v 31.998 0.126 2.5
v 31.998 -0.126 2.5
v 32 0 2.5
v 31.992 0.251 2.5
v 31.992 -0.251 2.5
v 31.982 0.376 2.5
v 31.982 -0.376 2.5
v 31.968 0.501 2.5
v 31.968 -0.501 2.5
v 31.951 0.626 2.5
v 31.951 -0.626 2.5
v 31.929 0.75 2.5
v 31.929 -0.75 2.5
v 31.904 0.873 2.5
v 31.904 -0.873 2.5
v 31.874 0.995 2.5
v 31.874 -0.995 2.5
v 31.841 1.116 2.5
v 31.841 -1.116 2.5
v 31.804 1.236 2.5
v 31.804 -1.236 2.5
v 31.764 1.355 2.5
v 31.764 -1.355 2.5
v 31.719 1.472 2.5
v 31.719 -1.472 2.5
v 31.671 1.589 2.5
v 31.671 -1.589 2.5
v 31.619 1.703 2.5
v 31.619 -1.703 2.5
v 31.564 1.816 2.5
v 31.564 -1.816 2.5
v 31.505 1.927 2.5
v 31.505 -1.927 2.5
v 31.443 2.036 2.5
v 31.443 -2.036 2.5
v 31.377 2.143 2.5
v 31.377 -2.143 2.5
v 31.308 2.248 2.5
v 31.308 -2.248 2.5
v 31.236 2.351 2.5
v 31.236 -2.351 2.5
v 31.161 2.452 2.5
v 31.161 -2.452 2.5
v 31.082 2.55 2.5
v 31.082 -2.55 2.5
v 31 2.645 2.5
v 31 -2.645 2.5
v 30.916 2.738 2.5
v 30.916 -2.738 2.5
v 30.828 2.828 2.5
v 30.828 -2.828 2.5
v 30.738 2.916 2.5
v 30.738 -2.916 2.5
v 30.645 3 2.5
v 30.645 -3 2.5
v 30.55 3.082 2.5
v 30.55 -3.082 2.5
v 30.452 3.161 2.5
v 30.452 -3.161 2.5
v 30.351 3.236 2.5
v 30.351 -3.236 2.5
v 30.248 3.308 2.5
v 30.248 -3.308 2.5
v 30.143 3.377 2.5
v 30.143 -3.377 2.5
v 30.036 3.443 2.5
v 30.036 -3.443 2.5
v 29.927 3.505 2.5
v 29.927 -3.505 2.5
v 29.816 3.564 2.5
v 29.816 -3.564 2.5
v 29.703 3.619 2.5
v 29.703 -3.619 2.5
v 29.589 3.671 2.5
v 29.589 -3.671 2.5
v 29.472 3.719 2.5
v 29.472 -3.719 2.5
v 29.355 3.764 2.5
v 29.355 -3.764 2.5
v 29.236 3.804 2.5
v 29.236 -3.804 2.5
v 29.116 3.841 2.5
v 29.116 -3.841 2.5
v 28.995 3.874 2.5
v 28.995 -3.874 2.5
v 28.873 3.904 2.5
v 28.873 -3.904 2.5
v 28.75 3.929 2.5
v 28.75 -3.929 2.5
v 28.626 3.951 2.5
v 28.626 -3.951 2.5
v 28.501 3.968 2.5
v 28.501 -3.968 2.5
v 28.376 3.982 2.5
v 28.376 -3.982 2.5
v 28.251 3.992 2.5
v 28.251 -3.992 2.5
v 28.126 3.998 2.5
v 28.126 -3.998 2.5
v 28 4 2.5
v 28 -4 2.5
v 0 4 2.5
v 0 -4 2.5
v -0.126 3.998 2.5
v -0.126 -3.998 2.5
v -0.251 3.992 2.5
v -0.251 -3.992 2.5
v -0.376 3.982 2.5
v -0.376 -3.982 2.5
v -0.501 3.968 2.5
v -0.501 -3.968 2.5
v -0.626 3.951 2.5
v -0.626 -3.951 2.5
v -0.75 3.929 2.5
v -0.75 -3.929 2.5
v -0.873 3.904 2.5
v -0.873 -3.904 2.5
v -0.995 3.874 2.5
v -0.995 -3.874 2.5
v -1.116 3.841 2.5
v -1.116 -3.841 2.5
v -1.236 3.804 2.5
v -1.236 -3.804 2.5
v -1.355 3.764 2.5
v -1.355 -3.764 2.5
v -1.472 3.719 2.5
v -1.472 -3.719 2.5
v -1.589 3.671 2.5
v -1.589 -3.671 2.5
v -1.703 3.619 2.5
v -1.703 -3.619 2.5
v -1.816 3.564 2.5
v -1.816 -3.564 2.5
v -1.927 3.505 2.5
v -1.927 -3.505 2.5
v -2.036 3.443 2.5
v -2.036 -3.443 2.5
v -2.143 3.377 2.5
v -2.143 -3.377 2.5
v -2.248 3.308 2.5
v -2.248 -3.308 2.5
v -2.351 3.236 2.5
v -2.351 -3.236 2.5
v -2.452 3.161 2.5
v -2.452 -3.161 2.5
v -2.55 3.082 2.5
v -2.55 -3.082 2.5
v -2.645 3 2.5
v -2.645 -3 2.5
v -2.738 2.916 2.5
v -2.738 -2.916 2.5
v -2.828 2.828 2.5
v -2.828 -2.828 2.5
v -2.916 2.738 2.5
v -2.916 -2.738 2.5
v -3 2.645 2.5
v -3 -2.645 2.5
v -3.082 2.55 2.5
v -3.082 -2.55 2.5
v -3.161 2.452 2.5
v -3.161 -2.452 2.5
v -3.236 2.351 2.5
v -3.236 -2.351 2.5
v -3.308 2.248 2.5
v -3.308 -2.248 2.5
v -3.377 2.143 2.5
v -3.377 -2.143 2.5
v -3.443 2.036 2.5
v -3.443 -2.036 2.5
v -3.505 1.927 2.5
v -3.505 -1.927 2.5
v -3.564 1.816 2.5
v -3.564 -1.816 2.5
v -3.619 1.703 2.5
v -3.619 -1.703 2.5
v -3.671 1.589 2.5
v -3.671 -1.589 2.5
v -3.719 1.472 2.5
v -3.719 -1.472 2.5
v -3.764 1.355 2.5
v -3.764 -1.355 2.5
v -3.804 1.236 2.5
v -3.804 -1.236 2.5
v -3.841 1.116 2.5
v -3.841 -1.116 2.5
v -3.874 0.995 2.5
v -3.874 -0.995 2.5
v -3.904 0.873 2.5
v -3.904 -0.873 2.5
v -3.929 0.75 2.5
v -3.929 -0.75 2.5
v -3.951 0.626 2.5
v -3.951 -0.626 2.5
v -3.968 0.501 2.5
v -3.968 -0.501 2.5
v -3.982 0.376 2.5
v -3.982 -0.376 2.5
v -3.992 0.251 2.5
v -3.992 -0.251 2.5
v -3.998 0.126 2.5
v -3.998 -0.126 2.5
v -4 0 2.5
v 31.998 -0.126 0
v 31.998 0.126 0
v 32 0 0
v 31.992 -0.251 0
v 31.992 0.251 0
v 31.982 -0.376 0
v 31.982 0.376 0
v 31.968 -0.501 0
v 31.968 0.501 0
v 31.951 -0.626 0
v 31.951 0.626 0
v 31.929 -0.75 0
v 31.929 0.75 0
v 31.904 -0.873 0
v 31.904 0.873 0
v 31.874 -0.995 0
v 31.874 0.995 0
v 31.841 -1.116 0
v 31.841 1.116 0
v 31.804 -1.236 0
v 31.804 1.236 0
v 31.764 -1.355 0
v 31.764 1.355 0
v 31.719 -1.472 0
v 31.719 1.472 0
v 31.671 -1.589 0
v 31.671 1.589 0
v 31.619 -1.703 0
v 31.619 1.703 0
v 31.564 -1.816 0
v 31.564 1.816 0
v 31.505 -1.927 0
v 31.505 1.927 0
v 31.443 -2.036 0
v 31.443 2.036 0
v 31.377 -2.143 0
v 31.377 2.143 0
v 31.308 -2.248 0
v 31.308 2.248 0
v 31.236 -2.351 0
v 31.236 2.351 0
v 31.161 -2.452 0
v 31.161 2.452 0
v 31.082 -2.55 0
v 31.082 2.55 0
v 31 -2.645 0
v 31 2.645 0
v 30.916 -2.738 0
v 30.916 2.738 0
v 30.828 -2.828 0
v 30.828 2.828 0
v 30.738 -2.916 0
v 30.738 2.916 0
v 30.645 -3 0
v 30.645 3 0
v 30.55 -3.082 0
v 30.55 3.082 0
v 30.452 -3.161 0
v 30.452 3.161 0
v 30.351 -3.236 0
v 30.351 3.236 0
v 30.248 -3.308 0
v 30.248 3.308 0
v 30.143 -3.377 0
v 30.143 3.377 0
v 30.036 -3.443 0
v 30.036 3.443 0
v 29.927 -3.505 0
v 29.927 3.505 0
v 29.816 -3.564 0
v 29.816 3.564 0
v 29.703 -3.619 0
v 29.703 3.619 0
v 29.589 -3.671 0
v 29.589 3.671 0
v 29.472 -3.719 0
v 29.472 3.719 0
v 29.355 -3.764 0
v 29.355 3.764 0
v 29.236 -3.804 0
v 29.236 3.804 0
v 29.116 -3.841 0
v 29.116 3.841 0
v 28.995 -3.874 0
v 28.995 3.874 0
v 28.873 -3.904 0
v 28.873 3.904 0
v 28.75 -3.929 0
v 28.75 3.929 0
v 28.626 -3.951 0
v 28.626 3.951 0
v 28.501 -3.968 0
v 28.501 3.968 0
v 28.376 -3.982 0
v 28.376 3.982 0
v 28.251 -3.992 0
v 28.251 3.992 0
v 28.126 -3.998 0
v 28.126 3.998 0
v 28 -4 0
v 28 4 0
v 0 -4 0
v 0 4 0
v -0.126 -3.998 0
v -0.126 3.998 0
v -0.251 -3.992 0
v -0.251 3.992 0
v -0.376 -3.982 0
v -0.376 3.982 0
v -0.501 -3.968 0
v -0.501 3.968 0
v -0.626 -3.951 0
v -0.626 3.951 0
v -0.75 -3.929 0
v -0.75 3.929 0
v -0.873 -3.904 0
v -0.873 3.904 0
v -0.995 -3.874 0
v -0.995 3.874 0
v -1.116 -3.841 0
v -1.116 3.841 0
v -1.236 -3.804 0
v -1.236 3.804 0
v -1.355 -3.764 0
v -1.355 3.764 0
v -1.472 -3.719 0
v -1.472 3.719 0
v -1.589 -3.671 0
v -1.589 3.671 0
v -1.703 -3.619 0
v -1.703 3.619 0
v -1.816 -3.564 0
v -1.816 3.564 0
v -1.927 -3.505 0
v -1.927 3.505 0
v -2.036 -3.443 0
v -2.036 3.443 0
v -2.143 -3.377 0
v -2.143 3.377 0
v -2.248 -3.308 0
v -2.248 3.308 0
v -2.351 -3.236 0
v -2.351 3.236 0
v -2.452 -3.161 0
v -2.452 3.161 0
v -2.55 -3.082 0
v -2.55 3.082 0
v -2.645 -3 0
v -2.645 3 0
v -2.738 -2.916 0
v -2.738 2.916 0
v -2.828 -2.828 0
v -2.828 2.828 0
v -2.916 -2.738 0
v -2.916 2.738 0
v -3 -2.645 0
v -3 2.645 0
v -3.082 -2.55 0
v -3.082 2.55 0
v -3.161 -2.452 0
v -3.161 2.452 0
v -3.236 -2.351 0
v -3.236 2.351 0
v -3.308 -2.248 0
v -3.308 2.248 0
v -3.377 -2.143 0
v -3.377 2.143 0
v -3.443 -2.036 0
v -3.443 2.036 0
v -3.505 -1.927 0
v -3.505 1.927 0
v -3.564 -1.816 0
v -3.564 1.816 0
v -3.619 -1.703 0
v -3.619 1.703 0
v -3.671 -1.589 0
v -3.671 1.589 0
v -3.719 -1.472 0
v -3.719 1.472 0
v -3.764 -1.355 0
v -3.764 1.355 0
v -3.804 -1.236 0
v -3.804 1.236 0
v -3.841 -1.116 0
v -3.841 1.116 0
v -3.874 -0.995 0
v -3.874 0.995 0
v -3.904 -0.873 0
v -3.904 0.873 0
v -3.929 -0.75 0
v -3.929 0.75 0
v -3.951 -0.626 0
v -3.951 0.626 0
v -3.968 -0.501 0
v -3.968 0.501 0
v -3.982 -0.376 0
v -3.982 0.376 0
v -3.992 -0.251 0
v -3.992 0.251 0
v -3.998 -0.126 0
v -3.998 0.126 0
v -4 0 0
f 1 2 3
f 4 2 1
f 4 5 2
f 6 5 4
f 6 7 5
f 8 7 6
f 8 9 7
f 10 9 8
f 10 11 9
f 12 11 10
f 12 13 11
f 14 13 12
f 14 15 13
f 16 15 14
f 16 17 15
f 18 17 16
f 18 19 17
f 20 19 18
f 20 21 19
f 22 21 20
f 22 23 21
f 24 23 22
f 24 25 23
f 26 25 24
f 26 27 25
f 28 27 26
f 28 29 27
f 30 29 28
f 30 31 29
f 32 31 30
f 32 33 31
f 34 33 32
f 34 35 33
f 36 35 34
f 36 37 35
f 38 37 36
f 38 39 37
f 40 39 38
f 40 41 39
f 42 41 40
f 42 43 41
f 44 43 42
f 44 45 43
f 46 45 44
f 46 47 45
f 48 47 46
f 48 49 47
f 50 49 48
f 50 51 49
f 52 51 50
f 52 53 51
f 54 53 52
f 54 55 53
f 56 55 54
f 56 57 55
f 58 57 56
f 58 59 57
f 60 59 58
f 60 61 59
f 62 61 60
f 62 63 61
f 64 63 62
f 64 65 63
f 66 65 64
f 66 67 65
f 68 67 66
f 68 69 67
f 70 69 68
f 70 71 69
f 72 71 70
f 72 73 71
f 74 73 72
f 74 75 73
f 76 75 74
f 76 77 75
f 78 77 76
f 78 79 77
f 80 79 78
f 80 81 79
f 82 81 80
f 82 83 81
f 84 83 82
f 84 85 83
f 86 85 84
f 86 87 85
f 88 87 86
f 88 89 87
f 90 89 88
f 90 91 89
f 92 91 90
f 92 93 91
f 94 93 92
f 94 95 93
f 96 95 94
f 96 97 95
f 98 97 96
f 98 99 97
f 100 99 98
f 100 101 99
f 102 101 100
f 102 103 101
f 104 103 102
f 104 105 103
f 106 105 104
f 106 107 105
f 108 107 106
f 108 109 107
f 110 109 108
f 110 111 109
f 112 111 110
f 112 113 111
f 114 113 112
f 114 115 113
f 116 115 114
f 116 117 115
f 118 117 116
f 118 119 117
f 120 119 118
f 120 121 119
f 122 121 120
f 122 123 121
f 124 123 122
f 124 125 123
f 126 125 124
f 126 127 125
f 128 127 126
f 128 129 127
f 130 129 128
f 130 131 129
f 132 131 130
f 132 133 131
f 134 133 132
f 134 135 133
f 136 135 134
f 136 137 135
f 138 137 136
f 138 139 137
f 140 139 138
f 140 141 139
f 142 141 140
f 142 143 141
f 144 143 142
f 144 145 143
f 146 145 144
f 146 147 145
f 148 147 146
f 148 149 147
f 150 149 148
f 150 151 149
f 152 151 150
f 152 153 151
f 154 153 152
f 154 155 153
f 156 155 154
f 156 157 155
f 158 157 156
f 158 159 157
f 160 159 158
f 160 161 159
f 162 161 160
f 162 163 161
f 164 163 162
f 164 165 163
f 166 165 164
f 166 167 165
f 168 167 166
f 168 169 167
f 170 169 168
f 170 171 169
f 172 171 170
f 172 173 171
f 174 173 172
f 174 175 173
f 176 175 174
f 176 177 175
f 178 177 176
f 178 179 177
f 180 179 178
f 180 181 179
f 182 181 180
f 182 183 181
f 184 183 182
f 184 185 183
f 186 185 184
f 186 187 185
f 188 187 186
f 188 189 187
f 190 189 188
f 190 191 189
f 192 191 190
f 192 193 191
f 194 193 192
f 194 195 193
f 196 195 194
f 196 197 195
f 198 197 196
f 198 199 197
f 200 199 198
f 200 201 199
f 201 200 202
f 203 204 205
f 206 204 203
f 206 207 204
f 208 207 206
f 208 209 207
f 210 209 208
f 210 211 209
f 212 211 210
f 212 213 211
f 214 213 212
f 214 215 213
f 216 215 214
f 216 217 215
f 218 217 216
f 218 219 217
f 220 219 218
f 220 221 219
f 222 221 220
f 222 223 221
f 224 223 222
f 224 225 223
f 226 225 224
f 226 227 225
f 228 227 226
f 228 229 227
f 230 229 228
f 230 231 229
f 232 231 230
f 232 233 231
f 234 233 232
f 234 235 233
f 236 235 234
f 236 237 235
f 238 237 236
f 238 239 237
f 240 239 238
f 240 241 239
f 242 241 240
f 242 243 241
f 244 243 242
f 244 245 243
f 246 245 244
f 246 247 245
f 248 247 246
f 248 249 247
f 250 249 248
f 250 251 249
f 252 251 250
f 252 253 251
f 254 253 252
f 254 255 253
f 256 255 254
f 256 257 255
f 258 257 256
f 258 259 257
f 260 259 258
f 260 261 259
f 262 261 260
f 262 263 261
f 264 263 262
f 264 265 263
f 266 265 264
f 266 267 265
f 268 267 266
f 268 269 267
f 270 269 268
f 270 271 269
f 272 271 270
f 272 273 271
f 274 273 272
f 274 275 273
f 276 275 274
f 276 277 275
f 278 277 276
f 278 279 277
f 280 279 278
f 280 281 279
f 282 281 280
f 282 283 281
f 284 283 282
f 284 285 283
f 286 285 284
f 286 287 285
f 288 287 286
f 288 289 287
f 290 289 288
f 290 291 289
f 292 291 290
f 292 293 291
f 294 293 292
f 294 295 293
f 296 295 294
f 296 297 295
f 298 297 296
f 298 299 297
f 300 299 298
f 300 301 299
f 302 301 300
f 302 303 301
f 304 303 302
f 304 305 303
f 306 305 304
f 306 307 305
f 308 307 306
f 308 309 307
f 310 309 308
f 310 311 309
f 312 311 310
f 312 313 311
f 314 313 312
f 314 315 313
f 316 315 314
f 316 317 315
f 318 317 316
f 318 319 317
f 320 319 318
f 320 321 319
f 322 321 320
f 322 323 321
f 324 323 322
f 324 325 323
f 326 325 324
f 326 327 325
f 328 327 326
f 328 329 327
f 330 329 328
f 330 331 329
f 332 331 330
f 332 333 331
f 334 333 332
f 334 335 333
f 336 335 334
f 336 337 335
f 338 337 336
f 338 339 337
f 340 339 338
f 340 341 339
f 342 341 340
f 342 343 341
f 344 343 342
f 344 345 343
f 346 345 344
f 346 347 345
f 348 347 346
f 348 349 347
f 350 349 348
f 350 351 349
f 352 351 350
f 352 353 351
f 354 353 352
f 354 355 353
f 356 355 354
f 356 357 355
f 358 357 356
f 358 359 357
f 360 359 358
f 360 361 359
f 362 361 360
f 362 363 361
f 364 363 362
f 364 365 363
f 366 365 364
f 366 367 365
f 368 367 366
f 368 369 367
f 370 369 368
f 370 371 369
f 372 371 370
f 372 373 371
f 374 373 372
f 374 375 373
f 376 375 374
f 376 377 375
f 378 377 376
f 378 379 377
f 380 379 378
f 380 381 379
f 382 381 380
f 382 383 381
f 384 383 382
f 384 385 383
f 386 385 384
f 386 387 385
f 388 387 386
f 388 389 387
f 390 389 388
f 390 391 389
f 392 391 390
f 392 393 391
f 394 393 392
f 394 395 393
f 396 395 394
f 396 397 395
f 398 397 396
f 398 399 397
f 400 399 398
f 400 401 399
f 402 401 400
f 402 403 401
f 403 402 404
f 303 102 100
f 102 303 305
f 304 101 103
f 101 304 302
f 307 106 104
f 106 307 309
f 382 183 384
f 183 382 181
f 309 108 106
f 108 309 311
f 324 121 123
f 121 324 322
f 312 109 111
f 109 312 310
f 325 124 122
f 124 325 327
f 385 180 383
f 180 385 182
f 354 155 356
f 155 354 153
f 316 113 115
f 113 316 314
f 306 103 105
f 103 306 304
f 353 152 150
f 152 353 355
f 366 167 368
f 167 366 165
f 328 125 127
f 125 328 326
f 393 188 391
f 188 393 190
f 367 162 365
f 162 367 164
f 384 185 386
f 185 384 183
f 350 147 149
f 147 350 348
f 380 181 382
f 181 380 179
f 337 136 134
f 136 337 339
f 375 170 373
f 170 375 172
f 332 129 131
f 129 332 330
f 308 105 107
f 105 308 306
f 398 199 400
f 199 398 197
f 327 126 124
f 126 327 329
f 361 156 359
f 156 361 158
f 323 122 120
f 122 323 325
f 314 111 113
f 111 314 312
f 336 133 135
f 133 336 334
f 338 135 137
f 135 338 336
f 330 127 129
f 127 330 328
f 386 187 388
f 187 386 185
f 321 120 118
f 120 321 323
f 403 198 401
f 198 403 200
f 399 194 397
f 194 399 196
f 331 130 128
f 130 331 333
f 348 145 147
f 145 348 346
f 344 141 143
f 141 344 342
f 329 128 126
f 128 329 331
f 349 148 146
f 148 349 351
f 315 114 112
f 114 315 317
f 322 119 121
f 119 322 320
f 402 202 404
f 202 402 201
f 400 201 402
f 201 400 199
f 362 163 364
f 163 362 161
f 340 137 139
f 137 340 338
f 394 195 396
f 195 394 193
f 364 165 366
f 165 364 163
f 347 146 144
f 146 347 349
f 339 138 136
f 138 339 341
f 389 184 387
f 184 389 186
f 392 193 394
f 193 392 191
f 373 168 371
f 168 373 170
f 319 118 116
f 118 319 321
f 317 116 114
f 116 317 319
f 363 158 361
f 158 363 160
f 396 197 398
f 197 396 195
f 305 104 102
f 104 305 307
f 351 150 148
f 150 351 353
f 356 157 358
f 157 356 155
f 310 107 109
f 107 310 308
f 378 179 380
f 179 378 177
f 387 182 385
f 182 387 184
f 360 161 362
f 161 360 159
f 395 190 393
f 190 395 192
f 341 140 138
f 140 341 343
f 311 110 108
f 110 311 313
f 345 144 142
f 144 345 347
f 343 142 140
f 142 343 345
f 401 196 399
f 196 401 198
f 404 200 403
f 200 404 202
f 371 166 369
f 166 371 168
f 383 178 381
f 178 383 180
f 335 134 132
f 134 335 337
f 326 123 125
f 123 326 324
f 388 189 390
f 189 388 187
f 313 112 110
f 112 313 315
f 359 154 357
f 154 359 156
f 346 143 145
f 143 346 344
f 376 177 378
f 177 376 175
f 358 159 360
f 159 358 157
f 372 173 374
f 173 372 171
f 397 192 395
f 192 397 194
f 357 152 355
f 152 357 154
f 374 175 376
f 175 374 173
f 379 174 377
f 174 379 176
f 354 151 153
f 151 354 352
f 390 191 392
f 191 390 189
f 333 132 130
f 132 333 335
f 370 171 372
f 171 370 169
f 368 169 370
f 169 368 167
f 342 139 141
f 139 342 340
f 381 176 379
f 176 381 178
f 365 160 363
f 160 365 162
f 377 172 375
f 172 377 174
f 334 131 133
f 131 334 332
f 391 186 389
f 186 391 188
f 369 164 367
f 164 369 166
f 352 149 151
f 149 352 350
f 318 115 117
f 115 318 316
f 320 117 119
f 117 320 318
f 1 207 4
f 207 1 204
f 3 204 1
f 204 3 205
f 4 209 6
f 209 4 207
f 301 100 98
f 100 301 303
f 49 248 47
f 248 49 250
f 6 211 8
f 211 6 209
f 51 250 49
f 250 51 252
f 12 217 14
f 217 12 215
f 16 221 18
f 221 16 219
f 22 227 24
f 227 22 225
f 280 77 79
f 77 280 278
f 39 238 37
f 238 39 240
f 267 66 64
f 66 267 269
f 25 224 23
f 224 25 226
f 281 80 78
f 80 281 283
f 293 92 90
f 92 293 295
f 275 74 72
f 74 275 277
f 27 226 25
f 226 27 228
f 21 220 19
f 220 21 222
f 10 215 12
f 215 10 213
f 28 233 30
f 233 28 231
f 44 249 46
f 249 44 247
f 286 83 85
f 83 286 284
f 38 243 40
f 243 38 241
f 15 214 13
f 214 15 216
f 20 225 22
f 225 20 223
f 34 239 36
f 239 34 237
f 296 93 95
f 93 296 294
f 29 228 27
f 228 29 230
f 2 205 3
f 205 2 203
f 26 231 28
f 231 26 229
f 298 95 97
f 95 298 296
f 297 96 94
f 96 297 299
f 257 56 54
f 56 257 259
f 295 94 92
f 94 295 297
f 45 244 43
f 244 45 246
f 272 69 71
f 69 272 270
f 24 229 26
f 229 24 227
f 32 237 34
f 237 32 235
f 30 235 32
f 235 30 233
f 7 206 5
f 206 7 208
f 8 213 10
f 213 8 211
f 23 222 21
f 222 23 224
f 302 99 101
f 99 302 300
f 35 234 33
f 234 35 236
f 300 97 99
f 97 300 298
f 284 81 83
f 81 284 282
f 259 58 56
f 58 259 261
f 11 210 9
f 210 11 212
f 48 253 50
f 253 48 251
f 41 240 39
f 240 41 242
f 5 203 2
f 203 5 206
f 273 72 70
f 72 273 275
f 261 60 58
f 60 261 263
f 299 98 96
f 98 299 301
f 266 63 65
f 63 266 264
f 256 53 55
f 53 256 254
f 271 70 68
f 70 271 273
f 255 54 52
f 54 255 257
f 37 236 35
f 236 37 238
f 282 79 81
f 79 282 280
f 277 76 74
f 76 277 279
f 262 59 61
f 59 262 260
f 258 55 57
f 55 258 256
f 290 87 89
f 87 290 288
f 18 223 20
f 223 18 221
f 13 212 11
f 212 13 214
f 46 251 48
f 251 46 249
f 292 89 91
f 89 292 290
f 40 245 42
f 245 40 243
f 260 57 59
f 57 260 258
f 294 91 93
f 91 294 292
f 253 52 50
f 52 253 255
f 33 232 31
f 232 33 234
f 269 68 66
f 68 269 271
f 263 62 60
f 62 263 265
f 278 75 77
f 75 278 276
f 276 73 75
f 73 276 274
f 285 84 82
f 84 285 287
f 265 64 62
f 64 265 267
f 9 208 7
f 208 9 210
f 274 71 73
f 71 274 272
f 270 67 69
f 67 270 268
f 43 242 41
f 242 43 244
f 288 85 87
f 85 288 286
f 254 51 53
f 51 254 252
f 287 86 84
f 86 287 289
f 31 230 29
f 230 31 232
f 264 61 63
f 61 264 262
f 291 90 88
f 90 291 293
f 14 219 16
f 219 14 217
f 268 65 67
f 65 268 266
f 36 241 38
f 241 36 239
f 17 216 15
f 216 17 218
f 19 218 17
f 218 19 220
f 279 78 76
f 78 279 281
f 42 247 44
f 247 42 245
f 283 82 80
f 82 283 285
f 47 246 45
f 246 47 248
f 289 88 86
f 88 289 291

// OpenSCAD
$fn = 200;

translate([0,-4,0])
cube([28, 8, 2.5]);

translate([0, 0, 0])
cylinder(r=4, h=2.5);

translate([28, 0, 0])
cylinder(r=4, h=2.5);
